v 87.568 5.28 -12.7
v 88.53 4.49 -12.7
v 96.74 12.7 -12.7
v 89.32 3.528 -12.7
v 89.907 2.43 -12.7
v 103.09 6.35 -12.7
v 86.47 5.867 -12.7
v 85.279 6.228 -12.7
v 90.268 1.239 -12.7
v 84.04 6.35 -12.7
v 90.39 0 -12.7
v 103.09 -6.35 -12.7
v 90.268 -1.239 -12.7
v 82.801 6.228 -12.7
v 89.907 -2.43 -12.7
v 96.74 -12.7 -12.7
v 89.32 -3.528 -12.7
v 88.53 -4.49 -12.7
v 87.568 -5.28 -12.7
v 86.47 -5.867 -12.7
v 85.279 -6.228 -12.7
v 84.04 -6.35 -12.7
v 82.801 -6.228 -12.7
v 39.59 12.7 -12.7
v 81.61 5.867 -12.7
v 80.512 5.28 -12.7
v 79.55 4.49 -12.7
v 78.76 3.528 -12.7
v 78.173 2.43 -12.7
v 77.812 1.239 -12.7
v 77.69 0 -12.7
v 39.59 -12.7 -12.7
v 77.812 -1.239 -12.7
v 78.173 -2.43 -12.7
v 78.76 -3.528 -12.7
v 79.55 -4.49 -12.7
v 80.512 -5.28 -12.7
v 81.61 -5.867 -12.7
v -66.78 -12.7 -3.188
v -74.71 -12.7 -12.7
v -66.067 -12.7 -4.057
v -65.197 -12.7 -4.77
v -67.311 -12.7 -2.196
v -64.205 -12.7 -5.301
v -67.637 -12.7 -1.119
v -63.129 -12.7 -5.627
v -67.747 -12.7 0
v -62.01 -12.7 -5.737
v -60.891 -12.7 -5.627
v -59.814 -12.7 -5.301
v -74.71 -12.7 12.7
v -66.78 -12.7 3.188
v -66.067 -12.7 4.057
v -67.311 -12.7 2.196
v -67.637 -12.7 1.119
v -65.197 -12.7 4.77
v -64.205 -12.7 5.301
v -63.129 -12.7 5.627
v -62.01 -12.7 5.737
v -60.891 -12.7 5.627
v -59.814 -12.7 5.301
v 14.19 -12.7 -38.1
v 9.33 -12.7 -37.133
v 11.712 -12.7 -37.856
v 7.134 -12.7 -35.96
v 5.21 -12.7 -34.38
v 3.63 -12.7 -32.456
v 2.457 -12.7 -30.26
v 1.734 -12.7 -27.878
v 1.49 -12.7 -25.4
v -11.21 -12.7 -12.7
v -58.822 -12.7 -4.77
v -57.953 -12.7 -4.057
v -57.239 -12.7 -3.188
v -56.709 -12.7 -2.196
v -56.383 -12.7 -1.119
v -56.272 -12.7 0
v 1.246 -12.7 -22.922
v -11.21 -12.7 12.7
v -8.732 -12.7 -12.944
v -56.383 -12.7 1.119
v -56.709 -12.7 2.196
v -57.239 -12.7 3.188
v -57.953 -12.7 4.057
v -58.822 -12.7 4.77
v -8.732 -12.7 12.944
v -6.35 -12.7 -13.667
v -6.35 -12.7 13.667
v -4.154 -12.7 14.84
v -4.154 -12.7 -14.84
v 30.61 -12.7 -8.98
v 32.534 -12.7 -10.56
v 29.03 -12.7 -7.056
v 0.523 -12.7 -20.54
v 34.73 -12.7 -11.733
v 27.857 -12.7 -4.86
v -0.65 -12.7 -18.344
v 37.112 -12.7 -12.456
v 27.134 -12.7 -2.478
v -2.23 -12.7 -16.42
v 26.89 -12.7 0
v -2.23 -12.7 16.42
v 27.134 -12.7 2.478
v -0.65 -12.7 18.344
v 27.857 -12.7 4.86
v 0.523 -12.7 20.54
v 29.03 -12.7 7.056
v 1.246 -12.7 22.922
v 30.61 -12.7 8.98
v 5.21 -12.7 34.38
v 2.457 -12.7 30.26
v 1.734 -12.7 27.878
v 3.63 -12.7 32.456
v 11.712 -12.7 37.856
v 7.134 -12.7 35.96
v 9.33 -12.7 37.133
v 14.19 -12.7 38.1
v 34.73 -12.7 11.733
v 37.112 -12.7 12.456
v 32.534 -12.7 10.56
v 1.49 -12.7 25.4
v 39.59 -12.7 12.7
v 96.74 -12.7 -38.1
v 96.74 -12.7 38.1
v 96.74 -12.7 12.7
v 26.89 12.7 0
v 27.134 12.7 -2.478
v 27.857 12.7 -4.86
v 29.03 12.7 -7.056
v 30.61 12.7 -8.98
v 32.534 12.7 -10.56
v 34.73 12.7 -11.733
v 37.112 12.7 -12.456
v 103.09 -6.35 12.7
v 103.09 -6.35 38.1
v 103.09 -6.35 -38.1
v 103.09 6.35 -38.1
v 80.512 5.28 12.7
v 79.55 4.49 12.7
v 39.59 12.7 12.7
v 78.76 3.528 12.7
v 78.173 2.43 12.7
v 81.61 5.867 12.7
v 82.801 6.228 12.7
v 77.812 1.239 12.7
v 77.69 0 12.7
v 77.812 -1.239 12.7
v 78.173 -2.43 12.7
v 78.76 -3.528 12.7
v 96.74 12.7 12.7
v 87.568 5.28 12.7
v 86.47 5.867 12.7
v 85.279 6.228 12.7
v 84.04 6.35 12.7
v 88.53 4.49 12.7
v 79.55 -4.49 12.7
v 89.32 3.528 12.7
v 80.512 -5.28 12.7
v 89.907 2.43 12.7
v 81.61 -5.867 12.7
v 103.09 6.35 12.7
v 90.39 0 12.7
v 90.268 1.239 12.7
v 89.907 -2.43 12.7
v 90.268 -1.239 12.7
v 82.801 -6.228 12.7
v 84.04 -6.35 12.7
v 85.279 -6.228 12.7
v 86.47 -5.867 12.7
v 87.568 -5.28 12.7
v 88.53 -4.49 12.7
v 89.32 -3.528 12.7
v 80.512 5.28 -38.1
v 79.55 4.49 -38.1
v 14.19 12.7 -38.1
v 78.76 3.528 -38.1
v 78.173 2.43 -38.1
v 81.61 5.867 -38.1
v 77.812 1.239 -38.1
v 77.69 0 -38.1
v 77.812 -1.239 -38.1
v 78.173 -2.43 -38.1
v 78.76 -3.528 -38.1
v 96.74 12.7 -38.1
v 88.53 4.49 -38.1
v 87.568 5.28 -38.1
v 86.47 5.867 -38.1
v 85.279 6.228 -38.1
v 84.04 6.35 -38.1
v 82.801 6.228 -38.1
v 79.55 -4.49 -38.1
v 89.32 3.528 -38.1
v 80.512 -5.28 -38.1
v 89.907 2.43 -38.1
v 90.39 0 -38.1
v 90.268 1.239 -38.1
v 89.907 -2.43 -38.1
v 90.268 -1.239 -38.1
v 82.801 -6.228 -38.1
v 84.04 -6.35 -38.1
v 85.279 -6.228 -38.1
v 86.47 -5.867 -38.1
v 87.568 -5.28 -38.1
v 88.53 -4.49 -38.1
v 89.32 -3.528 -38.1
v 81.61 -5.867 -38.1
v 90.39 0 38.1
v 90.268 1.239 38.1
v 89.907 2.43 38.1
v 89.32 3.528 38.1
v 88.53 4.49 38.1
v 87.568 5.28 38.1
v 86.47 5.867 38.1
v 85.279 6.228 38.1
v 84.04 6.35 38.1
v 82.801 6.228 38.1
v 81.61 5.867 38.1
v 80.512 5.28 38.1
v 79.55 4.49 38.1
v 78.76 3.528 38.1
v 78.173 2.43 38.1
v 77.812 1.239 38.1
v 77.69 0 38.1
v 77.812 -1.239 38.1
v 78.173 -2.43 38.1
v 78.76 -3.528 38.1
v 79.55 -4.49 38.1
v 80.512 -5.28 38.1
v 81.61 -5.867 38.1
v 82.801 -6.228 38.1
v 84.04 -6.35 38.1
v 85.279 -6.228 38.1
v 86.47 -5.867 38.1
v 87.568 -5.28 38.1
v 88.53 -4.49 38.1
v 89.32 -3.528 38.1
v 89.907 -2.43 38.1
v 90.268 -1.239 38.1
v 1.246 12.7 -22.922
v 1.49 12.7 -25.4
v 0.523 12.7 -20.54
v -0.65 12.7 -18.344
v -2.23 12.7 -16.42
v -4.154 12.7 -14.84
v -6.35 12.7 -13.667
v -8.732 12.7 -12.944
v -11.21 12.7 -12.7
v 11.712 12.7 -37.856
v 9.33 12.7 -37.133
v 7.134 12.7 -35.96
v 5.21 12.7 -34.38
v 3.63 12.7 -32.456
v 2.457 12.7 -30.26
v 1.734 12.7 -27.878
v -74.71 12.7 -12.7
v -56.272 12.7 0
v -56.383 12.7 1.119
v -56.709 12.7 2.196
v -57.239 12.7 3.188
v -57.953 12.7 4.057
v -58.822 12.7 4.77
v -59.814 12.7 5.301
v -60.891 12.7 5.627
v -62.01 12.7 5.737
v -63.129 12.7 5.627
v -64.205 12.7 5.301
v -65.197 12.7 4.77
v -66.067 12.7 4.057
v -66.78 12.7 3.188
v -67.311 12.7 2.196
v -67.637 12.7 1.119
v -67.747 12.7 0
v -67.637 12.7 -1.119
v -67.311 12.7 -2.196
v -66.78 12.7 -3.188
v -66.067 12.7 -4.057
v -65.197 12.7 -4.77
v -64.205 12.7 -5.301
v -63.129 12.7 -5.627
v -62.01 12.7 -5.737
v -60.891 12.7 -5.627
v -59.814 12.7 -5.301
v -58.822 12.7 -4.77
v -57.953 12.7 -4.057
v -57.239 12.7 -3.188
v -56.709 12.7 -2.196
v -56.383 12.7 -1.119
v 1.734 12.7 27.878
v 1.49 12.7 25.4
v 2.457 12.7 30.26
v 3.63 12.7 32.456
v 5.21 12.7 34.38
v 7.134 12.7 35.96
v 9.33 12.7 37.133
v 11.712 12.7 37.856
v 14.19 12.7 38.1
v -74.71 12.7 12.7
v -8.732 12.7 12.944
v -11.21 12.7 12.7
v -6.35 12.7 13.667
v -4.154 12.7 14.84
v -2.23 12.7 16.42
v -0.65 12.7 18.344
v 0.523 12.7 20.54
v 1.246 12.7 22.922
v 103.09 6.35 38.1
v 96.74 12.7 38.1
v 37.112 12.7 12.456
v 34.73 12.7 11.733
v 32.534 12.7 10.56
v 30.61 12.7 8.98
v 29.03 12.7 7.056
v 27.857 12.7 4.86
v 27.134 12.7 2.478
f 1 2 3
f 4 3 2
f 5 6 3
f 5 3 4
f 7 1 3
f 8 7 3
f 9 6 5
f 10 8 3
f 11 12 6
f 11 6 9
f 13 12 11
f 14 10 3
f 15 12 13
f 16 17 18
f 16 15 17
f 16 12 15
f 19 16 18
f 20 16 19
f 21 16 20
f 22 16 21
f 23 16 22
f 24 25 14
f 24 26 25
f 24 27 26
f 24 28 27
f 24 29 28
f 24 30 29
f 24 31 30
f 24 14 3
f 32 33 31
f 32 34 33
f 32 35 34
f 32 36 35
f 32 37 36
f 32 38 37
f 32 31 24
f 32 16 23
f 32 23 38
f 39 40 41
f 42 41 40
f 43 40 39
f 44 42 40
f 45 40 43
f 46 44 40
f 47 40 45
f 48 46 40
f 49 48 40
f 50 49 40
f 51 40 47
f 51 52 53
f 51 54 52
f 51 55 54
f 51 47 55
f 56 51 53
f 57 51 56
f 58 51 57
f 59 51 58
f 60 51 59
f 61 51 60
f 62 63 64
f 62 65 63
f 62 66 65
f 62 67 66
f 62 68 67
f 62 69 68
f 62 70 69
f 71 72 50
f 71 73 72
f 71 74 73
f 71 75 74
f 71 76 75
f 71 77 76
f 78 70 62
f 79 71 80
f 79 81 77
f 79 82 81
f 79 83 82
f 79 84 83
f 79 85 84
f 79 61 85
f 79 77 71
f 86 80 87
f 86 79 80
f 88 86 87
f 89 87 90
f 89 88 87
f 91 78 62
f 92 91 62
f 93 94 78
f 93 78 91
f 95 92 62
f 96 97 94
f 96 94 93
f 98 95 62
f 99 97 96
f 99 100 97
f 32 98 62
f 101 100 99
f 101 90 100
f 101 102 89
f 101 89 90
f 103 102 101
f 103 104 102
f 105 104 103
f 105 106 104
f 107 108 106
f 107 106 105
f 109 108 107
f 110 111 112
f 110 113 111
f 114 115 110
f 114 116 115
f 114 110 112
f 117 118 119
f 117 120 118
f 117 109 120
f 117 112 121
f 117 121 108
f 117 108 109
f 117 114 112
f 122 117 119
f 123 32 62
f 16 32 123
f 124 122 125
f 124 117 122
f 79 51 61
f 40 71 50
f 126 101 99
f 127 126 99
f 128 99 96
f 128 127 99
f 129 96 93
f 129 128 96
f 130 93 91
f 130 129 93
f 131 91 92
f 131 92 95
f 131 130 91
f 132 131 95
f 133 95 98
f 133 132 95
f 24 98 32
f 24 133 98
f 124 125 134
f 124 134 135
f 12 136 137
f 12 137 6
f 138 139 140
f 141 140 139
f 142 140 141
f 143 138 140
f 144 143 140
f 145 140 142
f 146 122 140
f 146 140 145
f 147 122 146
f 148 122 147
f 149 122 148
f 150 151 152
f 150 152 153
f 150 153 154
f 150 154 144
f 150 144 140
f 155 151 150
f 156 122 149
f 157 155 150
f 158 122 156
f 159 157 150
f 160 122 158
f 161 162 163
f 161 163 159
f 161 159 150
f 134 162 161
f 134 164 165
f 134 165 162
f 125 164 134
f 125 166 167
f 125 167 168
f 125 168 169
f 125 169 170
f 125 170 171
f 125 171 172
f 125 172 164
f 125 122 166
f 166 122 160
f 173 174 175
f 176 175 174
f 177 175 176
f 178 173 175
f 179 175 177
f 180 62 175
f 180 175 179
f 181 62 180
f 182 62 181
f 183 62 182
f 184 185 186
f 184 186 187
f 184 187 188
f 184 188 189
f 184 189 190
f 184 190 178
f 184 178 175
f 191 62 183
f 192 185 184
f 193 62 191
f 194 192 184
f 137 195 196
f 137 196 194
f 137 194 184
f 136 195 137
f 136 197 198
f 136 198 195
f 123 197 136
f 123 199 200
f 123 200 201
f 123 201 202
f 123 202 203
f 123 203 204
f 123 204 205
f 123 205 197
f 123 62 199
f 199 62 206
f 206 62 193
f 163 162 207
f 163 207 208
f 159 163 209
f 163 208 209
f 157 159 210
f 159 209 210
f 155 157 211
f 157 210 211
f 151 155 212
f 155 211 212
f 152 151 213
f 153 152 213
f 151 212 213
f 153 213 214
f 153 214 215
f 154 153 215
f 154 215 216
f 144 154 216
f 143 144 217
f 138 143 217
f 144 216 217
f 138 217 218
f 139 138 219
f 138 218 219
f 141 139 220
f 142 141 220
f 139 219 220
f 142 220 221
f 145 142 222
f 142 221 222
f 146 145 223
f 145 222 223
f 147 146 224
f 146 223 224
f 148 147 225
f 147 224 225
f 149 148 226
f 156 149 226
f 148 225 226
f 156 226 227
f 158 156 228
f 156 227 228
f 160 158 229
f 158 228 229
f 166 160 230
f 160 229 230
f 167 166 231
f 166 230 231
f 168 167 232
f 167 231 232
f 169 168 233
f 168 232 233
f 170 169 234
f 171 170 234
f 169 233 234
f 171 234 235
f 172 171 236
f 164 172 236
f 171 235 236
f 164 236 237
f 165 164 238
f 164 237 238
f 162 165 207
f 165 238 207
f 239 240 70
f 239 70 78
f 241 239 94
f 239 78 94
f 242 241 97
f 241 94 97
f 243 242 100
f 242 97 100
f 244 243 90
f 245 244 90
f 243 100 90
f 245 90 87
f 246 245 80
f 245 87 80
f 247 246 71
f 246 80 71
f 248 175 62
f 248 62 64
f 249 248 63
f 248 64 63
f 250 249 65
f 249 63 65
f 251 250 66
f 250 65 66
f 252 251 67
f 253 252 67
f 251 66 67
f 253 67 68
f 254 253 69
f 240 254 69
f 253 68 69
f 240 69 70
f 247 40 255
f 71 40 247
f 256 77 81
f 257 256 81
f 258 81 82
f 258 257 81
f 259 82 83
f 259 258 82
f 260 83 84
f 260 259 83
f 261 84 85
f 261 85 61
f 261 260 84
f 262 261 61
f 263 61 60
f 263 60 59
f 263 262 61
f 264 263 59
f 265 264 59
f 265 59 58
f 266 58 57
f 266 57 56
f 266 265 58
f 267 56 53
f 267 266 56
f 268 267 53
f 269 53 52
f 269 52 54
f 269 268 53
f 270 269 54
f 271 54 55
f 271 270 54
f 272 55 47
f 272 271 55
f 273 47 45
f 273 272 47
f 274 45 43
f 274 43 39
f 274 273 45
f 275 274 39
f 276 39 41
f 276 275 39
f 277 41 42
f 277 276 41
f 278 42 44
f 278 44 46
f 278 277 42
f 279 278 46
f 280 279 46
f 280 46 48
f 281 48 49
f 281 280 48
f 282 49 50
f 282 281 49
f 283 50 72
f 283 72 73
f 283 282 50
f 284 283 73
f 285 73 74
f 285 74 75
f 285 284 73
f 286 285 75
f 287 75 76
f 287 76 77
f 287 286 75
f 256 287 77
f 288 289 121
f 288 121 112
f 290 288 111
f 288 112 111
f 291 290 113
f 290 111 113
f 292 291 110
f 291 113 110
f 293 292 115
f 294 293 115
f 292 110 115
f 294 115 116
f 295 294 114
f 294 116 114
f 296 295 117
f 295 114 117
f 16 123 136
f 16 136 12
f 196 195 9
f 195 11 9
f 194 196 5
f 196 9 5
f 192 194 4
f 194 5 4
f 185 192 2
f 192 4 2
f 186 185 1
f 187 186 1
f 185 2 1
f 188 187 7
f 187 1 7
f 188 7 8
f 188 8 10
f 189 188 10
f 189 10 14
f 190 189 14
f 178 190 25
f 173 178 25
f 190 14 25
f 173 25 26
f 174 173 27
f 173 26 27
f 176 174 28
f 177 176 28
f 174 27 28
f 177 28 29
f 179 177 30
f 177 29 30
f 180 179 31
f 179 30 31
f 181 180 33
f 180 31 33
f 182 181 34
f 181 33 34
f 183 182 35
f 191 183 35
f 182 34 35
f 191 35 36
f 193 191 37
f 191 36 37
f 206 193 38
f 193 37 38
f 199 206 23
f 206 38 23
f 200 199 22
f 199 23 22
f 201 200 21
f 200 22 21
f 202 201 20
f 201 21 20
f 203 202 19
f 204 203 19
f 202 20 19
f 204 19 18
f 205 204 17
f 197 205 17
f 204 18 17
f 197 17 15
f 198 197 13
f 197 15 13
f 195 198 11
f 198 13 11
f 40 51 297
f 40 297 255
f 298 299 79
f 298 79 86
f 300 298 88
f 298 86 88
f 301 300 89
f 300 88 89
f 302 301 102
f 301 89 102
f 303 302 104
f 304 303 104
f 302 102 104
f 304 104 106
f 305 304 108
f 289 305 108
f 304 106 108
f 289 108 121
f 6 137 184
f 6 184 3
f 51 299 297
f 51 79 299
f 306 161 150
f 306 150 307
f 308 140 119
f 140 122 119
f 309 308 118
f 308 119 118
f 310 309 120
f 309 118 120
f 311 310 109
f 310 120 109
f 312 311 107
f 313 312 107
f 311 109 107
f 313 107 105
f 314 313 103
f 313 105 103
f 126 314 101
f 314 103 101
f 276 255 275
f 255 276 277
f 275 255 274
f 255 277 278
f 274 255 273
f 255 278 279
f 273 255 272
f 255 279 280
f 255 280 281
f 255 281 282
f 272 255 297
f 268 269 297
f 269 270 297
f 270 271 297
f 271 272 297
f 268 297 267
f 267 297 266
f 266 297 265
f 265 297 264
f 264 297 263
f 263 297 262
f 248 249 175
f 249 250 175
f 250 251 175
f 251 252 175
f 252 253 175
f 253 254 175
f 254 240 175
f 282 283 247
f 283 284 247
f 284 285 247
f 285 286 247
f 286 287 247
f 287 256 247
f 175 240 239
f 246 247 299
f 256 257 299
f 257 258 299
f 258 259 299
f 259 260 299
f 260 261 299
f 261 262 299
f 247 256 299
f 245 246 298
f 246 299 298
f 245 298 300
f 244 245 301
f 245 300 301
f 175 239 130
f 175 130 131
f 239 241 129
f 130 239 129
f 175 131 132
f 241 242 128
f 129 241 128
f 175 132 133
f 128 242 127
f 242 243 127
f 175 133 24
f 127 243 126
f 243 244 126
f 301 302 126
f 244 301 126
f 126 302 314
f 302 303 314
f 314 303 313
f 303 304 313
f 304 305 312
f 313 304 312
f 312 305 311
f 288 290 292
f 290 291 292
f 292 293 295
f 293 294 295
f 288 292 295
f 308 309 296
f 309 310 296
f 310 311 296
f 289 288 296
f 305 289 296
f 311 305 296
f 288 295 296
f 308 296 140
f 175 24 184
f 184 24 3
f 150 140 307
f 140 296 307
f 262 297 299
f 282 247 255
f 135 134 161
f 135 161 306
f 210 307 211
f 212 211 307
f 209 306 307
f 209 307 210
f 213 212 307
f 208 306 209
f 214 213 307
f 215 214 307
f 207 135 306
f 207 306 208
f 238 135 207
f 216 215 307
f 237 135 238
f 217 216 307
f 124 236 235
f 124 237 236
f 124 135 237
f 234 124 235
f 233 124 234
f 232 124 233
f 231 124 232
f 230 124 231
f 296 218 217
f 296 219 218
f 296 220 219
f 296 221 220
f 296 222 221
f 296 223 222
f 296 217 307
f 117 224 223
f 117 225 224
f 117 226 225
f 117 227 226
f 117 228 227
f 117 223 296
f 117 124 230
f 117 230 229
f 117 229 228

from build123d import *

# Parameters (mm, degrees)
F0_R     = 5.7374218315
F1_DEPTH = 12.7
F2_R     = 12.69999
F3_R     = 12.69999
F4_R     = 12.69999
F5_SIZE2 = 6.35
F5_SIZE  = 6.35
F6_SIZE2 = 6.35
F6_SIZE  = 6.35
F7_R     = 6.35
F8_DEPTH = 127


# Not quite as in the source:
# - a fillet or chamfer is up to 0.001 mm smaller than in the source, because OpenCascade refuses the exact size


with BuildPart() as f1:
    # F0 (on Front) → F1 (new body, symmetric)
    with BuildSketch(Plane.XZ):
        Polygon((26.8901219662, -12.7), (26.8901219662, 12.7), (1.4901219662, 12.7), (-74.7098780338, 12.7), (-74.7098780338, -12.7), (1.4901219662, -12.7), align=None)
        with Locations((-62.0098780338, 0)):
            Circle(F0_R, mode=Mode.SUBTRACT)
        Polygon((1.4901219662, 12.7), (26.8901219662, 12.7), (103.0901219662, 12.7), (103.0901219662, 38.1), (1.4901219662, 38.1), align=None)
        Polygon((103.0901219662, -12.7), (26.8901219662, -12.7), (1.4901219662, -12.7), (1.4901219662, -38.1), (103.0901219662, -38.1), align=None)
    extrude(amount=F1_DEPTH, both=True)

    # F2 (radius 12.7 in the source; OpenCascade refuses exactly that, so slightly less here)
    f2_edges = [f1.edges().sort_by_distance(p)[0] for p in [
        (1.490122, 0, 38.1),
        (1.490122, 0, 12.7),
    ]]
    fillet(f2_edges, radius=F2_R)

    # F3 (radius 12.7 in the source; OpenCascade refuses exactly that, so slightly less here)
    f3_edges = [f1.edges().sort_by_distance(p)[0] for p in [
        (26.890122, 0, 12.7),
        (26.890122, 0, -12.7),
    ]]
    fillet(f3_edges, radius=F3_R)

    # F4 (radius 12.7 in the source; OpenCascade refuses exactly that, so slightly less here)
    f4_edges = [f1.edges().sort_by_distance(p)[0] for p in [
        (1.490122, 0, -12.7),
        (1.490122, 0, -38.1),
    ]]
    fillet(f4_edges, radius=F4_R)

    # F5
    f5_edges = [f1.edges().sort_by_distance(p)[0] for p in [
        (103.090122, -12.7, 25.4),
        (103.090122, 12.7, 25.4),
    ]]
    chamfer(f5_edges, length=F5_SIZE, length2=F5_SIZE2)

    # F6
    f6_edges = [f1.edges().sort_by_distance(p)[0] for p in [
        (103.090122, -12.7, -25.4),
        (103.090122, 12.7, -25.4),
    ]]
    chamfer(f6_edges, length=F6_SIZE, length2=F6_SIZE2)

    # F7 (on Top) → F8 (cut, symmetric)
    with BuildSketch(Plane.XY):
        with Locations((84.0401219662, 0)):
            Circle(F7_R)
    extrude(amount=F8_DEPTH, both=True, mode=Mode.SUBTRACT)


solid = f1.part
